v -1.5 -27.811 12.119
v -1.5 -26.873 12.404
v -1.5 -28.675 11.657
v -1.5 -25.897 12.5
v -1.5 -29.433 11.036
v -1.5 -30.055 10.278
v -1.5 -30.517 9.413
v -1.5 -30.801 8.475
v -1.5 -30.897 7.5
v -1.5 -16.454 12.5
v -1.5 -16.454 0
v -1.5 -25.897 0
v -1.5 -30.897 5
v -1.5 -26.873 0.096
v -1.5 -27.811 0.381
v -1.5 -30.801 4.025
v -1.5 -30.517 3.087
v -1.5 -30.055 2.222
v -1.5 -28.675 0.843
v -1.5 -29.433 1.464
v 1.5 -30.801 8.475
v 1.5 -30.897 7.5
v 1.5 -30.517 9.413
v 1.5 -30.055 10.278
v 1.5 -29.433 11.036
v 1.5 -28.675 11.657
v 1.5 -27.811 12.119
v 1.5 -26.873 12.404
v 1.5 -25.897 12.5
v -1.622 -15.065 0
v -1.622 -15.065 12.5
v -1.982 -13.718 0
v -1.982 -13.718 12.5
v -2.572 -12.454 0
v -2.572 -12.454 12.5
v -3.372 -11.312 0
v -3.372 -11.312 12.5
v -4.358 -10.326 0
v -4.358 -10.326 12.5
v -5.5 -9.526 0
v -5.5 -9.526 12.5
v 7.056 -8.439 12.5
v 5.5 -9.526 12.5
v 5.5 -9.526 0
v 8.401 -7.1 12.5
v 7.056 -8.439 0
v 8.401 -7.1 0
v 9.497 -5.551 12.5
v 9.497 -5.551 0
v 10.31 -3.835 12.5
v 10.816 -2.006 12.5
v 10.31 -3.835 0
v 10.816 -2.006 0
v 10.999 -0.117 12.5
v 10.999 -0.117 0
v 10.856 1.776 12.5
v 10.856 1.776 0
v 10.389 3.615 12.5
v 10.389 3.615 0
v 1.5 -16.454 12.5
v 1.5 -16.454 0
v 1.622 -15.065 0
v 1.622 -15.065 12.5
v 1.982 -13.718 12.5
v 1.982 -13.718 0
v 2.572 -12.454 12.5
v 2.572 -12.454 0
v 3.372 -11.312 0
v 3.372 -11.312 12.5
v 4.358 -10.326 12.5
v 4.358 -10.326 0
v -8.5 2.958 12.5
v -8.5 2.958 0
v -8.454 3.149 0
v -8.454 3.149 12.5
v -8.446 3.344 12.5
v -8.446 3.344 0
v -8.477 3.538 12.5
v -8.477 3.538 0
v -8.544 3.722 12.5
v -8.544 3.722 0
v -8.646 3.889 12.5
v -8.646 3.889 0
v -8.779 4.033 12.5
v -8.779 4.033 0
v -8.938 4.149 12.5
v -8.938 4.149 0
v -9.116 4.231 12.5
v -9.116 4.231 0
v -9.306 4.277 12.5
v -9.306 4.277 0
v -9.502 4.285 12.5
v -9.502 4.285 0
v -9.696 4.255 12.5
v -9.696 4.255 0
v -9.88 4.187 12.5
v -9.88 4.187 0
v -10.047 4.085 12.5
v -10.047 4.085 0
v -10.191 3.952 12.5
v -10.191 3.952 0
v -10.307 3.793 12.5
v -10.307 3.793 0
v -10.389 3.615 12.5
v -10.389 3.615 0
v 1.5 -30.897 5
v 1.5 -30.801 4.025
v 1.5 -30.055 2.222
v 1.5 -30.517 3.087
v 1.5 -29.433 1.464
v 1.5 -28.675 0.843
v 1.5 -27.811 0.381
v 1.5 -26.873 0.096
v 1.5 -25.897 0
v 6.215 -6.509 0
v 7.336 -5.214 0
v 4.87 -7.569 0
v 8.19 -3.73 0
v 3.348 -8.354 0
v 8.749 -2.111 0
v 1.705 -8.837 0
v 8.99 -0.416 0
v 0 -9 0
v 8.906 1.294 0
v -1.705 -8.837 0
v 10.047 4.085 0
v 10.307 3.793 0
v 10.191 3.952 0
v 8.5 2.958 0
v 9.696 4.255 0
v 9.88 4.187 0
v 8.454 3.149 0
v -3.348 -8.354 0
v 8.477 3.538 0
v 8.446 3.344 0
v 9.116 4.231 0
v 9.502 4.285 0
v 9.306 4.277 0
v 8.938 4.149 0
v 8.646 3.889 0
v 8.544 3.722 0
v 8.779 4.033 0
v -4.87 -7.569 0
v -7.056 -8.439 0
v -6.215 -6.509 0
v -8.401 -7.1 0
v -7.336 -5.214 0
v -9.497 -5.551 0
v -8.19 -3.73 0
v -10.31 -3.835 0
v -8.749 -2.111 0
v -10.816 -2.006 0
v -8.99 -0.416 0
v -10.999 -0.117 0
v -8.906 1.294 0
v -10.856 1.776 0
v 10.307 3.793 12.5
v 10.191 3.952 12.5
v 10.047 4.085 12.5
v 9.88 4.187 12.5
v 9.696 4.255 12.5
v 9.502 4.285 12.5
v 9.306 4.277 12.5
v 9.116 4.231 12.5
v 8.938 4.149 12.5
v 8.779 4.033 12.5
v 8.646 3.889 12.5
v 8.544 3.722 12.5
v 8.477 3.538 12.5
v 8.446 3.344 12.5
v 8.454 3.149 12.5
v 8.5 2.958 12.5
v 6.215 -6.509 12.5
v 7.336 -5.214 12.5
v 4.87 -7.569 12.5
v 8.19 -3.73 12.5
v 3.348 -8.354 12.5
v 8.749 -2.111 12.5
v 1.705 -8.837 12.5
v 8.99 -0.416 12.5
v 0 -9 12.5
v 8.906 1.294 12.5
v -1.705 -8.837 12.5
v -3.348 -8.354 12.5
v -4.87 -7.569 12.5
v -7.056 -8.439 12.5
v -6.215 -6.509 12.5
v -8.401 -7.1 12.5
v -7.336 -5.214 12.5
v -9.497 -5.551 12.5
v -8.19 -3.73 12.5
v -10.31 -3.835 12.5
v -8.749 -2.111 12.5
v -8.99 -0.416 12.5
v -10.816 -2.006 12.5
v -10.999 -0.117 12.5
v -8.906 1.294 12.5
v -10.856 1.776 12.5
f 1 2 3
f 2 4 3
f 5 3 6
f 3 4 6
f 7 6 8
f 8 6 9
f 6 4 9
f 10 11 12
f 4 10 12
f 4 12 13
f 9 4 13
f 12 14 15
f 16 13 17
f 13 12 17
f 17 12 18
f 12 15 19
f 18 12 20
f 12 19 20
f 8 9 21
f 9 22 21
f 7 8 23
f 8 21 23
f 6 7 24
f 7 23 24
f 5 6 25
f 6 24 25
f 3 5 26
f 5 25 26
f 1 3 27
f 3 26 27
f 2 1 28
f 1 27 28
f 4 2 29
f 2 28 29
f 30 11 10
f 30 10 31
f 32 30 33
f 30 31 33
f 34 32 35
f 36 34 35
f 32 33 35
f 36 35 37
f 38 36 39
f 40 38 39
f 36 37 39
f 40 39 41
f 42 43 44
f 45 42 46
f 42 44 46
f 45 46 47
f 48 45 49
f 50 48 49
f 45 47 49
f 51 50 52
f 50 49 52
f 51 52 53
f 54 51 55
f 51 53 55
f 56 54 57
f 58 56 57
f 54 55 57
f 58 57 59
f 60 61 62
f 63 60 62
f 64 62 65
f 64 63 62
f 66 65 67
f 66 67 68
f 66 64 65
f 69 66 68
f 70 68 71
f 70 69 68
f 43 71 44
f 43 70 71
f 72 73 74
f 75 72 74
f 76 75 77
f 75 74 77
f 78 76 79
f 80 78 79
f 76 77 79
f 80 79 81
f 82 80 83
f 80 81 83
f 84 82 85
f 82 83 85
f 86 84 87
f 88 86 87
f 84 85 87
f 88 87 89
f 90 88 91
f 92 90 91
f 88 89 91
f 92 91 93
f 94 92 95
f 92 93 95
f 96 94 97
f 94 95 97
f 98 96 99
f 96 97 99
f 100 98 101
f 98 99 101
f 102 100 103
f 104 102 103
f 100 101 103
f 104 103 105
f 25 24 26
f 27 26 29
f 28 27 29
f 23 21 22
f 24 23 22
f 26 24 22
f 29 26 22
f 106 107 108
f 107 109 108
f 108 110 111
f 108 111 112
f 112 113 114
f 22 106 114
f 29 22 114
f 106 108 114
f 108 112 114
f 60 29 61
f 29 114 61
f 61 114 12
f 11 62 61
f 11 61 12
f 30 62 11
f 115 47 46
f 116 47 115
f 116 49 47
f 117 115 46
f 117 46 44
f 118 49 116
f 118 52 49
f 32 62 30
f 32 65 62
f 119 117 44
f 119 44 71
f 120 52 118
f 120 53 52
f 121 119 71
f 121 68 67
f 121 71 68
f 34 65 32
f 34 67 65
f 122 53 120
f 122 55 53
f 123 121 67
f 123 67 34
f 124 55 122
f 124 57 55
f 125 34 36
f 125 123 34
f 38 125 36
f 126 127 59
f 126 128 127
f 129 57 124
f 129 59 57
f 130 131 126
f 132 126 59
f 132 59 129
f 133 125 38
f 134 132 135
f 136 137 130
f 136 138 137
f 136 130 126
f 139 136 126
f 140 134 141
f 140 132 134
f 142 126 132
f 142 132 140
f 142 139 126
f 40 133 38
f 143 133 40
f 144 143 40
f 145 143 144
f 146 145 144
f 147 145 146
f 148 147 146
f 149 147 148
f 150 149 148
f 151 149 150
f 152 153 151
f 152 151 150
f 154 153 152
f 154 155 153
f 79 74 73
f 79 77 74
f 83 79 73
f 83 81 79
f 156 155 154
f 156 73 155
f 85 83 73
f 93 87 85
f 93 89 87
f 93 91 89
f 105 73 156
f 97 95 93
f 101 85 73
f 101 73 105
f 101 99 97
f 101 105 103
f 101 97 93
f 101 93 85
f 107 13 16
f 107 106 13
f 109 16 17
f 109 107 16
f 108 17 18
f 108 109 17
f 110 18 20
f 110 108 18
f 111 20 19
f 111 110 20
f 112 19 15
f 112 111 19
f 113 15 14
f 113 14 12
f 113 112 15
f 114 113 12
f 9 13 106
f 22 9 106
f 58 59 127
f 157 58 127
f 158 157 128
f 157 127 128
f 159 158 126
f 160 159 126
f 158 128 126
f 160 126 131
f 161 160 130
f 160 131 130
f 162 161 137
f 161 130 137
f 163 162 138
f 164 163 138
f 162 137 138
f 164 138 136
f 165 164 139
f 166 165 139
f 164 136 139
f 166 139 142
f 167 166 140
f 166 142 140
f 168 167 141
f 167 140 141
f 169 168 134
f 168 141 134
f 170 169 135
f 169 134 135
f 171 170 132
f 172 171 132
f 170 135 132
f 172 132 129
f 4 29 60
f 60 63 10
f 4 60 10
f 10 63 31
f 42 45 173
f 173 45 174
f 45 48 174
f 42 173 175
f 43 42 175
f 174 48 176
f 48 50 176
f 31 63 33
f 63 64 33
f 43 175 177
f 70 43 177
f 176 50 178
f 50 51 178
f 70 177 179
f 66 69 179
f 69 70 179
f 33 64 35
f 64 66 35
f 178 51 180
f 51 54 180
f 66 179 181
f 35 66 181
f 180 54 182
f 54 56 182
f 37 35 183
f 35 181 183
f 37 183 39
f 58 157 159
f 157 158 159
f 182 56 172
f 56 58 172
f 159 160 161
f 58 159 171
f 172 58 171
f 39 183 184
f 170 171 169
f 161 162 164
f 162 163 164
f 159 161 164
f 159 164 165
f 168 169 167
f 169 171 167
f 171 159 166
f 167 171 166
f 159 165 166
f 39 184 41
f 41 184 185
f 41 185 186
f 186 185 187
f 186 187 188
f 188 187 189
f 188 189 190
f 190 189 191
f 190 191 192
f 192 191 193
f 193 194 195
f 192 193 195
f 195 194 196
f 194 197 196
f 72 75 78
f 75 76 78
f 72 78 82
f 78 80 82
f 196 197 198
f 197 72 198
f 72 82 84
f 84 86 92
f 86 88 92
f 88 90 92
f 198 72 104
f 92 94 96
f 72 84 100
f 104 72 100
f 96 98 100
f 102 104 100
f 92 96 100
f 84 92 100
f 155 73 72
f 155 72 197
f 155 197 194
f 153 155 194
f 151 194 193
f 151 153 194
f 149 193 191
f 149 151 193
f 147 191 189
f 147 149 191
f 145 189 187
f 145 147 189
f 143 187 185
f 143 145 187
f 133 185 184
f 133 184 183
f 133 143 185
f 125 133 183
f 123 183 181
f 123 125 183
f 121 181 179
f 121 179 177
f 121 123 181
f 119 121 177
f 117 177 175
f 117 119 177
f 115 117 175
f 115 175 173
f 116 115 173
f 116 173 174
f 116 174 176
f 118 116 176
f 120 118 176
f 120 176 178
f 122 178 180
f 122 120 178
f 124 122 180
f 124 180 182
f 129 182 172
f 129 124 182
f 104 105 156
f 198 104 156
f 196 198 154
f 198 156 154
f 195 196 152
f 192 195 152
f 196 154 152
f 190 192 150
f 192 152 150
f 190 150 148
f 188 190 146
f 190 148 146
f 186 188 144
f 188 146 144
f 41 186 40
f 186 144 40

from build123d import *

# Parameters (mm, degrees)
PAD_DEPTH   = 12.5
FILLET_R    = 5
FILLET001_R = 8


with BuildPart() as part:
    # Sketch → Pad (new body)
    with BuildSketch(Plane.XY):
        with BuildLine():
            ThreePointArc((-8.5, 2.95804), (0, -9), (8.5, 2.95804))
            ThreePointArc((10.388889, 3.615382), (9.115773, 4.231155), (8.5, 2.95804))
            ThreePointArc((1.5, -10.897247), (9.380326, -5.745387), (10.388889, 3.615382))
            Line((1.5, -30.897247), (1.5, -10.897247))
            Line((-1.5, -30.897247), (1.5, -30.897247))
            Line((-1.5, -10.897247), (-1.5, -30.897247))
            ThreePointArc((-10.388889, 3.615382), (-9.380326, -5.745387), (-1.5, -10.897247))
            ThreePointArc((-8.5, 2.95804), (-9.115773, 4.231155), (-10.388889, 3.615382))
        make_face()
    extrude(amount=PAD_DEPTH)

    # Fillet
    fillet_edges = [part.edges().sort_by_distance(p)[0] for p in [
        (0, -30.897247, 0),
        (0, -30.897247, 12.5),
    ]]
    fillet(fillet_edges, radius=FILLET_R)

    # Fillet001
    fillet001_edges = [part.edges().sort_by_distance(p)[0] for p in [
        (1.5, -10.897247, 6.25),
        (-1.5, -10.897247, 6.25),
    ]]
    fillet(fillet001_edges, radius=FILLET001_R)


solid = part.part
